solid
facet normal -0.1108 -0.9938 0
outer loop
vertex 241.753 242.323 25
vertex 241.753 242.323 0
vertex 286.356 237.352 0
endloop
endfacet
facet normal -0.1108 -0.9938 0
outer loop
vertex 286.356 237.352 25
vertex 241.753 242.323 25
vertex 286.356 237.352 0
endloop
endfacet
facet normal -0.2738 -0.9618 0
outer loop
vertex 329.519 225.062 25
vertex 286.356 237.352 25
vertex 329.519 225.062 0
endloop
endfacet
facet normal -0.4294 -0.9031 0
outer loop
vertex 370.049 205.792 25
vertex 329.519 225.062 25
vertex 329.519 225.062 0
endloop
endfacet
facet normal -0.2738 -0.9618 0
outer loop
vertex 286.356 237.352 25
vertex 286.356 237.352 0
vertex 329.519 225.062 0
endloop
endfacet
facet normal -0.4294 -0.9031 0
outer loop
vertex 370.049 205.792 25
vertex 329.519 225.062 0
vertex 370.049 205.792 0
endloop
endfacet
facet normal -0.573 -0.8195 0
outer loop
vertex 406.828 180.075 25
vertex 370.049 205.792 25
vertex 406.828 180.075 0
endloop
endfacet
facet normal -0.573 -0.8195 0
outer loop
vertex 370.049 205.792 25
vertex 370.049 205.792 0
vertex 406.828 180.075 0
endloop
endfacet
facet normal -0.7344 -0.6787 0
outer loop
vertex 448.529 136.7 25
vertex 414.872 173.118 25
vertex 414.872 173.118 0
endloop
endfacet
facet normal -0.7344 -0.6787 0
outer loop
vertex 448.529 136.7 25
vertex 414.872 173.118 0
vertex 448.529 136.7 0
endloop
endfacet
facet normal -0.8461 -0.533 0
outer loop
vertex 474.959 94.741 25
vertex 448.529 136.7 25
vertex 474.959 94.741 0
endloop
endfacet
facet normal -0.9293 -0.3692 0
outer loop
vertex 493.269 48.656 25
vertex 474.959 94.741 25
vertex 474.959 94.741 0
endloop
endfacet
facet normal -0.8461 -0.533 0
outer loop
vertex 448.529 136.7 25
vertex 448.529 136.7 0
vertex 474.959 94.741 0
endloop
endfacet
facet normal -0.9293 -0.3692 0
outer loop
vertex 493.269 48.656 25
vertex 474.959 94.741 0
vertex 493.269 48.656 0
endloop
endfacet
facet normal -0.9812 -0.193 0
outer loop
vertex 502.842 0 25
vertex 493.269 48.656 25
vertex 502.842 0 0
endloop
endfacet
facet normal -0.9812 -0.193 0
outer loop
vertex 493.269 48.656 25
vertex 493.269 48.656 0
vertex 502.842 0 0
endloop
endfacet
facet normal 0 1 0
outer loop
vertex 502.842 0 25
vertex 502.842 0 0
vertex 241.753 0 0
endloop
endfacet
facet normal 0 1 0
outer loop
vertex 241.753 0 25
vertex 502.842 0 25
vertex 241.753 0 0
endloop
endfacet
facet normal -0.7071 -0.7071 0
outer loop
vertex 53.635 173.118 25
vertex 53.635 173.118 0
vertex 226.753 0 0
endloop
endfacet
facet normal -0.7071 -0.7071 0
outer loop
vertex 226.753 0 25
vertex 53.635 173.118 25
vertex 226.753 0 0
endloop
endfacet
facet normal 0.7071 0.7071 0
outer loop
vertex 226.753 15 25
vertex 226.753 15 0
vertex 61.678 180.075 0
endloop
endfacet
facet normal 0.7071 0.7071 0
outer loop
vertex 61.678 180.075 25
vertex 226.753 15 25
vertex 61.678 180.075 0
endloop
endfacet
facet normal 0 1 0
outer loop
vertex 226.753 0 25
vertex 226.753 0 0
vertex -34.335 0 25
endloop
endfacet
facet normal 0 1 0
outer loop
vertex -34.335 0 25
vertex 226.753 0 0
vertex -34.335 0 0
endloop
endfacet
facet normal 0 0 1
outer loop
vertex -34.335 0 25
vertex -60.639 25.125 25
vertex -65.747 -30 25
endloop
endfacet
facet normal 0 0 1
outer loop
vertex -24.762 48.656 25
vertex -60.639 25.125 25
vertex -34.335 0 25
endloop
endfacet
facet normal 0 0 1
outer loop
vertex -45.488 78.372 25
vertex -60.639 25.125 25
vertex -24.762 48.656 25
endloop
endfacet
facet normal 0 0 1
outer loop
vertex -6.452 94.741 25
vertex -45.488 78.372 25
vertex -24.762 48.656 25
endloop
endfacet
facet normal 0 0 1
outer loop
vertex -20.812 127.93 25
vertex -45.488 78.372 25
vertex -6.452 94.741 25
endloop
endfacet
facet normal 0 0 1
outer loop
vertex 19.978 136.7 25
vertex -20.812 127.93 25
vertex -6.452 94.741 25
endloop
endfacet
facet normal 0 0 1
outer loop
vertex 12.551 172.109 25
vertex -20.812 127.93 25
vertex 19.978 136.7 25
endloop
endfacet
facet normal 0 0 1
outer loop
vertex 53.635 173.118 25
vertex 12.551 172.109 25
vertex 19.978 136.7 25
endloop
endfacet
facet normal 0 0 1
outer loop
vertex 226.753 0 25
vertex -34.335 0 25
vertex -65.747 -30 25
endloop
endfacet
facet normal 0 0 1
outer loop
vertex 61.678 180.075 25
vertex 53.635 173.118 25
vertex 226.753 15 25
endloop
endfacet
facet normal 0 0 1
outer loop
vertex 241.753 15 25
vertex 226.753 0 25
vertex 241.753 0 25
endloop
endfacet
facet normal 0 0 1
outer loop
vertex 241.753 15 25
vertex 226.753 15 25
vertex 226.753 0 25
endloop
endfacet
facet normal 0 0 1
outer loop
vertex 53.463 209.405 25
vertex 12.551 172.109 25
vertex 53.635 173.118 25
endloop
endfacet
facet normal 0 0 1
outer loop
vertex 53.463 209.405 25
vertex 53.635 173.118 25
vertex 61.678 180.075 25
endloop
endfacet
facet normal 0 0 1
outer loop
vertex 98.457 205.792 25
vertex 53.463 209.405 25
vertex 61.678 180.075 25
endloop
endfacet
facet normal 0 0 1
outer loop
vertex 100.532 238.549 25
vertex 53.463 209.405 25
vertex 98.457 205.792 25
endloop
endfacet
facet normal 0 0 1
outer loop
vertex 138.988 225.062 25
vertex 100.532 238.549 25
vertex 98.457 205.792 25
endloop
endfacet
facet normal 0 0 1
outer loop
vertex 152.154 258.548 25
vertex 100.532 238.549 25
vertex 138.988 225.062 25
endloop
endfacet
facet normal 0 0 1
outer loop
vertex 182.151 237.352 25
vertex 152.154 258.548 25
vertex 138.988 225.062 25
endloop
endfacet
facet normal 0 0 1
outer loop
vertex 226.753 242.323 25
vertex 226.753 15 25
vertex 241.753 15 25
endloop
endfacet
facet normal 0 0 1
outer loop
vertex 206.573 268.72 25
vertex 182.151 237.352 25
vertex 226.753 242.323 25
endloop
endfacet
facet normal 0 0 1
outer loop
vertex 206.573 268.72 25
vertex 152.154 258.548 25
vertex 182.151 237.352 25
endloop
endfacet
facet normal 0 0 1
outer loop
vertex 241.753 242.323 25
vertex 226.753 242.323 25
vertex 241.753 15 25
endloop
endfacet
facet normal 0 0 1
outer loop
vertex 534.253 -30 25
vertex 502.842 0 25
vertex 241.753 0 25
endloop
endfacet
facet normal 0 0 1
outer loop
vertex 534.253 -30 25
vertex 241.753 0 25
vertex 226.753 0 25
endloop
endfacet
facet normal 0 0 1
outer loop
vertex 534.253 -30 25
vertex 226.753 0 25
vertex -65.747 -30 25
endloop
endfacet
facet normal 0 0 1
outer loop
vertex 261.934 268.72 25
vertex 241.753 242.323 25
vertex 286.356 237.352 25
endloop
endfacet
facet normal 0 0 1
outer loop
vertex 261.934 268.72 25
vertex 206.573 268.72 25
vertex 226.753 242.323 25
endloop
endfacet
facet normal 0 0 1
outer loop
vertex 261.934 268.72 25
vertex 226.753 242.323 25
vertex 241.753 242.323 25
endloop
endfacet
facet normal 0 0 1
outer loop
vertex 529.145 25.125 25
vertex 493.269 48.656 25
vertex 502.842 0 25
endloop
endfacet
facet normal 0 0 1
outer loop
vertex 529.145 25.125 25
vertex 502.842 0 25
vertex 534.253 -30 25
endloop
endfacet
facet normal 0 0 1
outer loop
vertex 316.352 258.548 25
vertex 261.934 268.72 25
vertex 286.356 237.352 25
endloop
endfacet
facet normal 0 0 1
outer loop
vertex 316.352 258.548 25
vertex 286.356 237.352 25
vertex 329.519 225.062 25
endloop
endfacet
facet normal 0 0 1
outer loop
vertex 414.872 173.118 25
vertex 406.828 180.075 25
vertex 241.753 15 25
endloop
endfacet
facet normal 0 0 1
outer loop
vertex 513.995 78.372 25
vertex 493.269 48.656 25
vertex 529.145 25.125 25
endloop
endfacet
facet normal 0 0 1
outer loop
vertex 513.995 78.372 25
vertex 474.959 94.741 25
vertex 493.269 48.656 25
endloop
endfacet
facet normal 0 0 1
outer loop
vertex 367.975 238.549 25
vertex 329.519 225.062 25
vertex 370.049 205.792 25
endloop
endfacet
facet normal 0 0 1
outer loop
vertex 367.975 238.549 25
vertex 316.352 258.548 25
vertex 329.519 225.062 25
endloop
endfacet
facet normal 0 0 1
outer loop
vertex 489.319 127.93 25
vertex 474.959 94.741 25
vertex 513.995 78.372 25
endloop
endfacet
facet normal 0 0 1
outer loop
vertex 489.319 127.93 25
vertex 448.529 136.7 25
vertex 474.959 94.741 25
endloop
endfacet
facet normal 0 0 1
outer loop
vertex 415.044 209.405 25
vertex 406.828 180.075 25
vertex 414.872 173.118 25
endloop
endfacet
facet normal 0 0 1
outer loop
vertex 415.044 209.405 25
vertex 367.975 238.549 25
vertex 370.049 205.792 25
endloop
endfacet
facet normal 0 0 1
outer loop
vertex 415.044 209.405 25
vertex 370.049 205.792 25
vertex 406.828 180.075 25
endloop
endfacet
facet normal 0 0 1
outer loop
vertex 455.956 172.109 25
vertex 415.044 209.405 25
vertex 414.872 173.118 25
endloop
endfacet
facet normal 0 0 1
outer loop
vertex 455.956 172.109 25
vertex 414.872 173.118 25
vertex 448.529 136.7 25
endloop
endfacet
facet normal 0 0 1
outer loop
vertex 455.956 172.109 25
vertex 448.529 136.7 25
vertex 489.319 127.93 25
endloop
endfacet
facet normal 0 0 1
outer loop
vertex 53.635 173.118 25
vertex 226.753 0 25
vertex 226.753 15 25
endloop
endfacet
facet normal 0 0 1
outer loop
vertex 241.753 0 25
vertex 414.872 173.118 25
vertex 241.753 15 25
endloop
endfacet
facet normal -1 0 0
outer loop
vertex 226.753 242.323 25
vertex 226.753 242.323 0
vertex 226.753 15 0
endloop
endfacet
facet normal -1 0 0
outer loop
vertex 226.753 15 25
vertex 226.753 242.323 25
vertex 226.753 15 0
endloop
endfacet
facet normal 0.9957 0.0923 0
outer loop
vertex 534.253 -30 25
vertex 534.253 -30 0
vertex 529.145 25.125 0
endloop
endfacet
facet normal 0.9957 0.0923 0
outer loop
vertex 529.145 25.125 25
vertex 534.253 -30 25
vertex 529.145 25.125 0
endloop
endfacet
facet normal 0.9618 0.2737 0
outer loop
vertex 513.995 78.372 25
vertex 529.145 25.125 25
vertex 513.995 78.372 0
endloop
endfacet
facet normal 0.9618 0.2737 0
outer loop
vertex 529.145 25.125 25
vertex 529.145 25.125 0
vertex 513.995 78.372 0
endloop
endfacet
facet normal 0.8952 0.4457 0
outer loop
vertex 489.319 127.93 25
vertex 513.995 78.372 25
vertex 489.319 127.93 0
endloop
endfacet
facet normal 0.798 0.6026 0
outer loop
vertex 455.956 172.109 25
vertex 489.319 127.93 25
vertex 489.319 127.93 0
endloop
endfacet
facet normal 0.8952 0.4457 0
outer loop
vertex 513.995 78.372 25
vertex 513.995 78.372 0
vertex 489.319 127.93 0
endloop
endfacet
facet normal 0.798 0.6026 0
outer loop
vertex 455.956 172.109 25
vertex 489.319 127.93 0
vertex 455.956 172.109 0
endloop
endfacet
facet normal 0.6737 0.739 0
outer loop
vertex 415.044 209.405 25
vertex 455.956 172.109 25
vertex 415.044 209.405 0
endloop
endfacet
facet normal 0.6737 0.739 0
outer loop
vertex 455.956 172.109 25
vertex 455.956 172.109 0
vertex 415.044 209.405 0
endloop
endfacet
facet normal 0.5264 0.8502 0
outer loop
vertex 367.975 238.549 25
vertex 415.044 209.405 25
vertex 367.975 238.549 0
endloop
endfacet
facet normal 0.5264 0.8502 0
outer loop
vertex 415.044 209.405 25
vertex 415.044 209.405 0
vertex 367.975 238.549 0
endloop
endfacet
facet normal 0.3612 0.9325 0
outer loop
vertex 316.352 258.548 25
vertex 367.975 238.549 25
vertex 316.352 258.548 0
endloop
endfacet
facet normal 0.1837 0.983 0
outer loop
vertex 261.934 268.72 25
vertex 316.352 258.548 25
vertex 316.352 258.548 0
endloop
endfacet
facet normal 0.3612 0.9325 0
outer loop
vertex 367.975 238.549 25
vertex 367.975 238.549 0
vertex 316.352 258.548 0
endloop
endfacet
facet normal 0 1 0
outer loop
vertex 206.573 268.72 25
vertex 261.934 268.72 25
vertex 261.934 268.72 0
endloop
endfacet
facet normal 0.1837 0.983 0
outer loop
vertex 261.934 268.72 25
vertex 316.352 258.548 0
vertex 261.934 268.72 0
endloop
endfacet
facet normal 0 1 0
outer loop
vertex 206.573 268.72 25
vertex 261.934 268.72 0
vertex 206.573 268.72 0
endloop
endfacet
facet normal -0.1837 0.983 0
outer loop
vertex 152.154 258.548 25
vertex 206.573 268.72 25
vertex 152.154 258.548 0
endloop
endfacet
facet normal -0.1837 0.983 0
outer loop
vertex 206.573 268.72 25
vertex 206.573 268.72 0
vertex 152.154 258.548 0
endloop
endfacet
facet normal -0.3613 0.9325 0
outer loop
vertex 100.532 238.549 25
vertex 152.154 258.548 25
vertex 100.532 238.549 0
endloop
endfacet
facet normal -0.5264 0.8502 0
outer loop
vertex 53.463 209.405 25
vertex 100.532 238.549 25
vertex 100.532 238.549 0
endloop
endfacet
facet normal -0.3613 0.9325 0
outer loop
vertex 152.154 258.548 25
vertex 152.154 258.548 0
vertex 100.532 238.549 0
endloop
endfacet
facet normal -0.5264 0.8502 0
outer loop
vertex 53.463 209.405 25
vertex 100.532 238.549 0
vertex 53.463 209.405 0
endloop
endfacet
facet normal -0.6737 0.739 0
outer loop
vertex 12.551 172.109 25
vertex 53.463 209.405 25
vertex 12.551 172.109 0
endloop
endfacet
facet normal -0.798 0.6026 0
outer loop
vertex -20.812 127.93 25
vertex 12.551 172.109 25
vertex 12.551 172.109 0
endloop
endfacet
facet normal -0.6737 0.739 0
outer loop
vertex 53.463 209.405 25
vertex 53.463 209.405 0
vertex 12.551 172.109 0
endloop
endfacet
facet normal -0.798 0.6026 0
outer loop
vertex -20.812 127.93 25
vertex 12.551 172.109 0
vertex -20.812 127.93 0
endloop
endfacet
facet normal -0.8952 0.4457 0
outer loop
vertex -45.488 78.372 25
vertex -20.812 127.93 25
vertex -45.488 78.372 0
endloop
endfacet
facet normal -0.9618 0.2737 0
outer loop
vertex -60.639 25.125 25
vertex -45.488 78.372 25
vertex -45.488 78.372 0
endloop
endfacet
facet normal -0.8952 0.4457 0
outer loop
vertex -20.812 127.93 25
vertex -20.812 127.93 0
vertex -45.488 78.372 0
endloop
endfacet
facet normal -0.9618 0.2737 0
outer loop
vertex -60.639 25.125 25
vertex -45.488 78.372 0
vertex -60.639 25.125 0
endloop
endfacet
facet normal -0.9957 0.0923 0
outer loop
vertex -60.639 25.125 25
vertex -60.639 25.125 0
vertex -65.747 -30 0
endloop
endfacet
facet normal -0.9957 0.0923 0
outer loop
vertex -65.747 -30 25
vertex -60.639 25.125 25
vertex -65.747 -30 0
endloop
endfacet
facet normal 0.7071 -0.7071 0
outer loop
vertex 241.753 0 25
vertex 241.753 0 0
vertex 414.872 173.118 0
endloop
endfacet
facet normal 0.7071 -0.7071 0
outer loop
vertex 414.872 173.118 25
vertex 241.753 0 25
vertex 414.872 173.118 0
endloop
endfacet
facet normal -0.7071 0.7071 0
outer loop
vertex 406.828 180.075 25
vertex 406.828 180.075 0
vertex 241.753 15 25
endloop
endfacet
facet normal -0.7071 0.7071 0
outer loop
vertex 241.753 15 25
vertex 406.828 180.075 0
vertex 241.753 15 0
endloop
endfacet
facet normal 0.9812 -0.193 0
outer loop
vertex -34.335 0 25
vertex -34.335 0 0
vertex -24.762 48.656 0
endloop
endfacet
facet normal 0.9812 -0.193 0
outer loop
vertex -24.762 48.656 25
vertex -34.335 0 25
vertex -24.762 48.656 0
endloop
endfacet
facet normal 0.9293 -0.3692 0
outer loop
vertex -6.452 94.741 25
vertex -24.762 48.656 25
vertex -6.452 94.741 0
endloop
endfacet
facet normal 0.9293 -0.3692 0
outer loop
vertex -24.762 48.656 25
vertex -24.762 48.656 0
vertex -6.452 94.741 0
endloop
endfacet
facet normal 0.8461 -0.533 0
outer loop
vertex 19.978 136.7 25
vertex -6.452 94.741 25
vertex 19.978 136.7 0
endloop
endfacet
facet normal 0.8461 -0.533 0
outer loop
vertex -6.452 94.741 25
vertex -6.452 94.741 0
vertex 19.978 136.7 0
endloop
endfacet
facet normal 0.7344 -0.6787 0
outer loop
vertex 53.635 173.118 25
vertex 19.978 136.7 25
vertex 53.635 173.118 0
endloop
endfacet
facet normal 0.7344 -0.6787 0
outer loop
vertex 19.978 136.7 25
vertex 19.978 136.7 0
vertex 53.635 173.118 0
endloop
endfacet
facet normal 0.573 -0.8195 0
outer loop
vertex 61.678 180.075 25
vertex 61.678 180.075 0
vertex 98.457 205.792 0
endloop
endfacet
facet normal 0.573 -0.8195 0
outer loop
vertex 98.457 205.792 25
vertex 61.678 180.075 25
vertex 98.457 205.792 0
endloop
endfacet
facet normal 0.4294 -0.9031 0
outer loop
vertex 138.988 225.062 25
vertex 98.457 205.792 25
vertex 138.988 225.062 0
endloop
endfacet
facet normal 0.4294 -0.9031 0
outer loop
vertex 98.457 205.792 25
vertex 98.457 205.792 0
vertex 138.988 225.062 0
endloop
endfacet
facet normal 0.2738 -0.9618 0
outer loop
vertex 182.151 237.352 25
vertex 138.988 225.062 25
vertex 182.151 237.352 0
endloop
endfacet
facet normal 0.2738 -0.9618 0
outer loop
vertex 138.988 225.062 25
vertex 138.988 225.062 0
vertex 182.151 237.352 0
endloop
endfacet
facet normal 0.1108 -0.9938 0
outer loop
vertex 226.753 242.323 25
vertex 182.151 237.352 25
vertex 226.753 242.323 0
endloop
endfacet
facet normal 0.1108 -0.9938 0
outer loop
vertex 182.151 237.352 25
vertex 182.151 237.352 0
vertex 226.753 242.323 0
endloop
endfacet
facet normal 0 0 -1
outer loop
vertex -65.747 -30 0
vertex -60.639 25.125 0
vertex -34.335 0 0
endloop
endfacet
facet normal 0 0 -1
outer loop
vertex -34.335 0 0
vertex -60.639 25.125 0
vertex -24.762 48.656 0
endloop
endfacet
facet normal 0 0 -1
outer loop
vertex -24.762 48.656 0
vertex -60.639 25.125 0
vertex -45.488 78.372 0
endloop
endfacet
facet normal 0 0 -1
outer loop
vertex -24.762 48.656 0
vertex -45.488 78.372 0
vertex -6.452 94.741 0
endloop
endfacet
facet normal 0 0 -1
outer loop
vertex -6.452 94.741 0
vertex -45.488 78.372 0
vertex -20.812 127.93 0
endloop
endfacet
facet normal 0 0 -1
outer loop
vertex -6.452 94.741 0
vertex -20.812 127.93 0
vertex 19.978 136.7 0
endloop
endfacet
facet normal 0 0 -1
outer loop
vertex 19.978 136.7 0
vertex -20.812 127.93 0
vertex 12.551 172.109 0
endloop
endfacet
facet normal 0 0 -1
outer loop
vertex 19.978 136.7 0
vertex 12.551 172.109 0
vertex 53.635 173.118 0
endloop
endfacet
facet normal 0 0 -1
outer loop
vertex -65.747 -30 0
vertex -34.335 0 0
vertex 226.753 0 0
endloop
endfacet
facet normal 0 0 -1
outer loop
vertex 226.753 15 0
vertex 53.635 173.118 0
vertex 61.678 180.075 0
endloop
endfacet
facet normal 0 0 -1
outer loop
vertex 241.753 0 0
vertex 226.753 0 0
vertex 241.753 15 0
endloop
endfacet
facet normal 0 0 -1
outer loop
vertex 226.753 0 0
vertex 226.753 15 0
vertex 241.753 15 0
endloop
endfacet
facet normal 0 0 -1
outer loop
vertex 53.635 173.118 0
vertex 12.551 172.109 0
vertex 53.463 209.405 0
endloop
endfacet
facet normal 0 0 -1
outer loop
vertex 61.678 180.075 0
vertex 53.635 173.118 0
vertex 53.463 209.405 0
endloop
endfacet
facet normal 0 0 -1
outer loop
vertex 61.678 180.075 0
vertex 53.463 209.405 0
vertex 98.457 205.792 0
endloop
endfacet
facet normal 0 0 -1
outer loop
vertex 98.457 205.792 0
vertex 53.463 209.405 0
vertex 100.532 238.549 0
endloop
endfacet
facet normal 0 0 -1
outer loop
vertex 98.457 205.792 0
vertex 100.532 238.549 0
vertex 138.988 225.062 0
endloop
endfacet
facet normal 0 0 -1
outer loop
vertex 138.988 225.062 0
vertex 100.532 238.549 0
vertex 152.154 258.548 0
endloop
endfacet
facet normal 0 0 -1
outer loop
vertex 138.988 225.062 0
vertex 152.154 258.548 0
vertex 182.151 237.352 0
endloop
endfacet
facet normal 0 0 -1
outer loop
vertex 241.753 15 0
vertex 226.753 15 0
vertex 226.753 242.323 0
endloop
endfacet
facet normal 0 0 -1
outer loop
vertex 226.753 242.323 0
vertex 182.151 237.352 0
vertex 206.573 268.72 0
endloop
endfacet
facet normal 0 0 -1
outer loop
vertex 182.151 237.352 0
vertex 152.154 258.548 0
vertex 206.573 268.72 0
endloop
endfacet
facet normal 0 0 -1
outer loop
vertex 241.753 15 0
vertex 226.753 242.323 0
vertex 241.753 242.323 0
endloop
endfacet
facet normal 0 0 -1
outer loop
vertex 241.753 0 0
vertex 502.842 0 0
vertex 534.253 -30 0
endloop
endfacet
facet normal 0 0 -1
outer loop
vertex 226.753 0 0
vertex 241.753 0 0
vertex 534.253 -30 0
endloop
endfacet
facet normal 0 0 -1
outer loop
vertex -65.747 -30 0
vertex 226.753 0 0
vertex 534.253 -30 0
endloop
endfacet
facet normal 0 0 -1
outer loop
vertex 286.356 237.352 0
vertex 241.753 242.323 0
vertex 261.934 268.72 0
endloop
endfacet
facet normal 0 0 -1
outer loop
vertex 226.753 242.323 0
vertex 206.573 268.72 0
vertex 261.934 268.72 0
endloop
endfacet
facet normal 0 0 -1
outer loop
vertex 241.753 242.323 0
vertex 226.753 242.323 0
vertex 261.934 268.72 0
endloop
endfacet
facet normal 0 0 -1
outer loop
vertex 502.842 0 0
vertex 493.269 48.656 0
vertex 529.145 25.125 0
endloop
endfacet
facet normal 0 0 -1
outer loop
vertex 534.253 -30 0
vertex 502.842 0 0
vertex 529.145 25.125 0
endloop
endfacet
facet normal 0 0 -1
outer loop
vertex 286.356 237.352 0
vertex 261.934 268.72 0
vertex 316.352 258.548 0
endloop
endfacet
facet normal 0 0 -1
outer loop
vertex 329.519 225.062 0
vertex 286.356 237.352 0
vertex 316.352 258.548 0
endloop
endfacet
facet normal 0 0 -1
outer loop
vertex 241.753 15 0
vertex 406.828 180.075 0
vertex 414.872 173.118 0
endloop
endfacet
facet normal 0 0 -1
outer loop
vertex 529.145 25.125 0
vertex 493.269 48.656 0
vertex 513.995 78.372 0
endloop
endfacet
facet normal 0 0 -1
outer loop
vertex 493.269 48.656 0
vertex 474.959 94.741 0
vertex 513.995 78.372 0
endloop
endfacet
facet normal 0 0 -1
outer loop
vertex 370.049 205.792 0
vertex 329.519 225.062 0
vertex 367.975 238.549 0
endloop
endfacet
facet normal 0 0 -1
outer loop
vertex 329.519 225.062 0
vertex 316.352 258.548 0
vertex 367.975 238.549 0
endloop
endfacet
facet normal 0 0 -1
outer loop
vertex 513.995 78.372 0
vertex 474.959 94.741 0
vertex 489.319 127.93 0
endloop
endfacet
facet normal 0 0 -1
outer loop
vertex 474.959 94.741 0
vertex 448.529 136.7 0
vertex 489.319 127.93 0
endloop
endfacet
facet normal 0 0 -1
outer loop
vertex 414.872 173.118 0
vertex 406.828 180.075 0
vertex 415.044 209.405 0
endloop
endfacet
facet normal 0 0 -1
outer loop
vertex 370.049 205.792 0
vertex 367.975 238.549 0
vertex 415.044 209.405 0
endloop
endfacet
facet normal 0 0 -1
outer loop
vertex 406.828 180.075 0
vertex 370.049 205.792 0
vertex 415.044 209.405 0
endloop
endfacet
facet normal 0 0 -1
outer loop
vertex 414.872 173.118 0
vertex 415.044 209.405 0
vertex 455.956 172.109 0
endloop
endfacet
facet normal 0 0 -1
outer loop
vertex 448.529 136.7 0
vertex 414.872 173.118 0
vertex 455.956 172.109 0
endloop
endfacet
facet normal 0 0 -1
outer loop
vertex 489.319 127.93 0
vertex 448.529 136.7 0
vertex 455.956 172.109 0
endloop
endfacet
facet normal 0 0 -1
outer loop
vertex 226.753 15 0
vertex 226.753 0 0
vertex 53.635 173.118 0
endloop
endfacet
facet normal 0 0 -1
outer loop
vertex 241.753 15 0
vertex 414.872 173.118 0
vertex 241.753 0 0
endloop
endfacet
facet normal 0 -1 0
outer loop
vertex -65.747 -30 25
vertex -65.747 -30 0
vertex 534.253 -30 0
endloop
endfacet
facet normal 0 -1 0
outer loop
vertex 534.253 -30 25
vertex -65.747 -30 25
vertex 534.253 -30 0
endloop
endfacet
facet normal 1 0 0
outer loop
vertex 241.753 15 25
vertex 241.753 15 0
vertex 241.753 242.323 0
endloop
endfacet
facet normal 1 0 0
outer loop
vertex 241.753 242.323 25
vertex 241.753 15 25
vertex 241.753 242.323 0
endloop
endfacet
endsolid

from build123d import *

# Parameters (mm, degrees)
F1_DEPTH = 25


with BuildPart() as f1:
    # F0 (on Top) → F1 (new body)
    with BuildSketch(Plane.XY):
        with BuildLine():
            ThreePointArc((534.253372, -30), (234.253372, 270), (-65.746628, -30))
            Line((-65.746628, -30), (534.253372, -30))
        make_face()
        with BuildLine():
            Line((226.753372, 0), (-34.335003, 0))
            ThreePointArc((-34.335003, 0), (-6.452084, 94.741433), (53.635165, 173.118207))
            Line((53.635165, 173.118207), (226.753372, 0))
        make_face(mode=Mode.SUBTRACT)
        with BuildLine():
            ThreePointArc((414.871579, 173.118207), (474.958829, 94.741433), (502.841748, 0))
            Line((502.841748, 0), (241.753372, 0))
            Line((241.753372, 0), (414.871579, 173.118207))
        make_face(mode=Mode.SUBTRACT)
        with BuildLine():
            Line((226.753372, 242.322557), (226.753372, 15))
            Line((226.753372, 15), (61.678279, 180.075094))
            ThreePointArc((61.678279, 180.075094), (138.988234, 225.061962), (226.753372, 242.322557))
        make_face(mode=Mode.SUBTRACT)
        with BuildLine():
            Line((406.828466, 180.075094), (241.753372, 15))
            Line((241.753372, 15), (241.753372, 242.322557))
            ThreePointArc((241.753372, 242.322557), (329.51851, 225.061962), (406.828466, 180.075094))
        make_face(mode=Mode.SUBTRACT)
    extrude(amount=F1_DEPTH)


solid = f1.part
